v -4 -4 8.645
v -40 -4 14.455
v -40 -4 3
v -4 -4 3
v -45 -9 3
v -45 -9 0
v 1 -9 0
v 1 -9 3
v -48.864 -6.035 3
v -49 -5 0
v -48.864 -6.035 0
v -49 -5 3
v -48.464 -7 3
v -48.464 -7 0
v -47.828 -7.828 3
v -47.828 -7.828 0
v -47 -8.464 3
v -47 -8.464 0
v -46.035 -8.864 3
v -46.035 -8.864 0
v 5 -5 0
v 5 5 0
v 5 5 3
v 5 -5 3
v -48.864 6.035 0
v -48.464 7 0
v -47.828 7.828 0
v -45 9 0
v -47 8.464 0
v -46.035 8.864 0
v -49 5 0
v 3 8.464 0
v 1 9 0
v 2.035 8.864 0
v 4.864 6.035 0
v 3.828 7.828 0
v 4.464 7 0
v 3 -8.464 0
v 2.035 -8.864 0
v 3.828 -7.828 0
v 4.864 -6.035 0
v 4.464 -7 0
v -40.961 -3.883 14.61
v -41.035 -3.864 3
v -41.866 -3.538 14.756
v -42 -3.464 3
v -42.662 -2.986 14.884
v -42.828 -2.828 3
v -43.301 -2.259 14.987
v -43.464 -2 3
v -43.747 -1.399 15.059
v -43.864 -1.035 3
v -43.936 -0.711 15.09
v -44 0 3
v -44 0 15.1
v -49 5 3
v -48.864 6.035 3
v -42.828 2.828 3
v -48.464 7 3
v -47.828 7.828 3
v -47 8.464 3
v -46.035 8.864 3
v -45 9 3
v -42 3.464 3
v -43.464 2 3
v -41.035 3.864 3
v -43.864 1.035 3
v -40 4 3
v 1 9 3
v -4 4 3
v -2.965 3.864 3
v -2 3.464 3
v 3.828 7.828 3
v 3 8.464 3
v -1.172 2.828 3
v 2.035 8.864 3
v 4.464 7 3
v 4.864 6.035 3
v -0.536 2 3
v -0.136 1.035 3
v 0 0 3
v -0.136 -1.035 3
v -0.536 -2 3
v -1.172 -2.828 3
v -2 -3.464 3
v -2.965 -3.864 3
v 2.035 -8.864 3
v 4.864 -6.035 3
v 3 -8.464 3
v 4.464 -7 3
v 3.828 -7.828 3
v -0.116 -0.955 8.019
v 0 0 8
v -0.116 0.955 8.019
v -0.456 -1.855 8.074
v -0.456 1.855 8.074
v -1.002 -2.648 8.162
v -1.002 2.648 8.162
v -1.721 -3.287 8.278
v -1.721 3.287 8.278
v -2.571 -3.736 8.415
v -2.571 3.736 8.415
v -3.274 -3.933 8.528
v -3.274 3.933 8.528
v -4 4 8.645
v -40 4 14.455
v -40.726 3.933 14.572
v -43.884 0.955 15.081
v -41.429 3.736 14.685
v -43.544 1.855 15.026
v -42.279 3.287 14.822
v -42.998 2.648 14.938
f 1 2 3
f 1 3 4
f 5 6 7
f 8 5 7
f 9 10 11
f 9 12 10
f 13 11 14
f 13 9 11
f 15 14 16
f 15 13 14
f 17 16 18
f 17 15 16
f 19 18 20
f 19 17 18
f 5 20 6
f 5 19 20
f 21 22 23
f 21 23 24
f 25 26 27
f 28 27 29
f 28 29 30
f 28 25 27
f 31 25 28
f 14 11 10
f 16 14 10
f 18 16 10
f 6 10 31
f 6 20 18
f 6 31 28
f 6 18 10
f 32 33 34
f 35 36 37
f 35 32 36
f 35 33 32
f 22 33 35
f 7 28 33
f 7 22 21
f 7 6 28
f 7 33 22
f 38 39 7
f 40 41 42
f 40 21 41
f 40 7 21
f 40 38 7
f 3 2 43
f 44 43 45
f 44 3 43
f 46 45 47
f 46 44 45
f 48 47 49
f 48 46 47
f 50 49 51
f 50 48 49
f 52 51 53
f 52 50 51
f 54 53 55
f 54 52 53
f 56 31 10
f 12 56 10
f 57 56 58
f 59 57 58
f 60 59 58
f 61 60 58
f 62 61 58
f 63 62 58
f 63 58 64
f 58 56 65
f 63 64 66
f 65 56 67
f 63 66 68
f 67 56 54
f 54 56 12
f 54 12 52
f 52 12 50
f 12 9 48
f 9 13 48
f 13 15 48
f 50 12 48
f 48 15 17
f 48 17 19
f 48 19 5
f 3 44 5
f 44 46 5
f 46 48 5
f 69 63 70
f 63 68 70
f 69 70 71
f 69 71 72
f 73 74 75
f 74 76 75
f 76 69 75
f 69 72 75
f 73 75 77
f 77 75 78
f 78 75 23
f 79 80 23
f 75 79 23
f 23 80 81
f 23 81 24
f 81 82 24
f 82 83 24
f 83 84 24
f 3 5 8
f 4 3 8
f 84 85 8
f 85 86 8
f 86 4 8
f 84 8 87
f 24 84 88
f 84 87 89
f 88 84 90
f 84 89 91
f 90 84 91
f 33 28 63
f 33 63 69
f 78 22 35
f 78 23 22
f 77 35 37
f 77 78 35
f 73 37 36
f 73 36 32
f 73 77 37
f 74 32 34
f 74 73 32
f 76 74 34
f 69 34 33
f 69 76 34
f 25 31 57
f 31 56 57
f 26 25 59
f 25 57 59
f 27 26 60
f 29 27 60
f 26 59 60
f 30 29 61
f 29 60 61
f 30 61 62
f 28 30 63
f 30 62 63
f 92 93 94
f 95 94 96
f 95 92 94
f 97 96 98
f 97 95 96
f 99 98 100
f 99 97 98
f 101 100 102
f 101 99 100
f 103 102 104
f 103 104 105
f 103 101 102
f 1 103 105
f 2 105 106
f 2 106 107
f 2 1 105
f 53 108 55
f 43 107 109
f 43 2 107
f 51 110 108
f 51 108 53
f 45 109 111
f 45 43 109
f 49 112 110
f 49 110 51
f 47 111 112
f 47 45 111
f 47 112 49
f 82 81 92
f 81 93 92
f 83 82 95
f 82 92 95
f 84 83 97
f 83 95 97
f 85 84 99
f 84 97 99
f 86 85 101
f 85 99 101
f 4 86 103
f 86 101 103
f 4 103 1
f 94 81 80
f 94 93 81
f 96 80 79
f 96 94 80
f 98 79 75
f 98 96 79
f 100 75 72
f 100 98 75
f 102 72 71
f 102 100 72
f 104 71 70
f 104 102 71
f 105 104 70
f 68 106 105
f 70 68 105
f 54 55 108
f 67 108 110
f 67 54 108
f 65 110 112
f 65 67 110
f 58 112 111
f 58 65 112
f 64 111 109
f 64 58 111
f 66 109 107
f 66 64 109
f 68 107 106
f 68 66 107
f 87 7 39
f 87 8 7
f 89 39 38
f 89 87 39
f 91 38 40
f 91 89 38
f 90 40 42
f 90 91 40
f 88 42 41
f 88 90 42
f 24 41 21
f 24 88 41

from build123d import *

# Parameters (mm, degrees)
F1_DEPTH = 4
F2_W     = 54
F2_H     = 18
F3_DEPTH = 3
F4_R     = 3.99999


# Not quite as in the source:
# - a fillet or chamfer is up to 0.001 mm smaller than in the source, because OpenCascade refuses the exact size


with BuildPart() as f1:
    # F0 (on Front) → F1 (new body, symmetric)
    with BuildSketch(Plane.XZ):
        Polygon((-49, 0), (5, 0), (5, 3), (0, 3), (0, 8), (-44, 15.1), (-44, 3), (-49, 3), align=None)
    extrude(amount=F1_DEPTH, both=True)

    # F2 (on face) → F3 (join, through all)
    with BuildSketch(Plane(origin=(0, 0, 0), x_dir=(1, 0, 0), z_dir=(0, 0, -1))):
        with Locations((-22, 0)):
            Rectangle(F2_W, F2_H)
    extrude(amount=-F3_DEPTH)

    # F4 (radius 4 in the source; OpenCascade refuses exactly that, so slightly less here)
    f4_edges = [f1.edges().sort_by_distance(p)[0] for p in [
        (0, -4, 5.5),
        (0, 4, 5.5),
        (-44, 4, 9.05),
        (-44, -4, 9.05),
        (-49, -9, 1.5),
        (-49, 9, 1.5),
        (5, 9, 1.5),
        (5, -9, 1.5),
    ]]
    fillet(f4_edges, radius=F4_R)


solid = f1.part
